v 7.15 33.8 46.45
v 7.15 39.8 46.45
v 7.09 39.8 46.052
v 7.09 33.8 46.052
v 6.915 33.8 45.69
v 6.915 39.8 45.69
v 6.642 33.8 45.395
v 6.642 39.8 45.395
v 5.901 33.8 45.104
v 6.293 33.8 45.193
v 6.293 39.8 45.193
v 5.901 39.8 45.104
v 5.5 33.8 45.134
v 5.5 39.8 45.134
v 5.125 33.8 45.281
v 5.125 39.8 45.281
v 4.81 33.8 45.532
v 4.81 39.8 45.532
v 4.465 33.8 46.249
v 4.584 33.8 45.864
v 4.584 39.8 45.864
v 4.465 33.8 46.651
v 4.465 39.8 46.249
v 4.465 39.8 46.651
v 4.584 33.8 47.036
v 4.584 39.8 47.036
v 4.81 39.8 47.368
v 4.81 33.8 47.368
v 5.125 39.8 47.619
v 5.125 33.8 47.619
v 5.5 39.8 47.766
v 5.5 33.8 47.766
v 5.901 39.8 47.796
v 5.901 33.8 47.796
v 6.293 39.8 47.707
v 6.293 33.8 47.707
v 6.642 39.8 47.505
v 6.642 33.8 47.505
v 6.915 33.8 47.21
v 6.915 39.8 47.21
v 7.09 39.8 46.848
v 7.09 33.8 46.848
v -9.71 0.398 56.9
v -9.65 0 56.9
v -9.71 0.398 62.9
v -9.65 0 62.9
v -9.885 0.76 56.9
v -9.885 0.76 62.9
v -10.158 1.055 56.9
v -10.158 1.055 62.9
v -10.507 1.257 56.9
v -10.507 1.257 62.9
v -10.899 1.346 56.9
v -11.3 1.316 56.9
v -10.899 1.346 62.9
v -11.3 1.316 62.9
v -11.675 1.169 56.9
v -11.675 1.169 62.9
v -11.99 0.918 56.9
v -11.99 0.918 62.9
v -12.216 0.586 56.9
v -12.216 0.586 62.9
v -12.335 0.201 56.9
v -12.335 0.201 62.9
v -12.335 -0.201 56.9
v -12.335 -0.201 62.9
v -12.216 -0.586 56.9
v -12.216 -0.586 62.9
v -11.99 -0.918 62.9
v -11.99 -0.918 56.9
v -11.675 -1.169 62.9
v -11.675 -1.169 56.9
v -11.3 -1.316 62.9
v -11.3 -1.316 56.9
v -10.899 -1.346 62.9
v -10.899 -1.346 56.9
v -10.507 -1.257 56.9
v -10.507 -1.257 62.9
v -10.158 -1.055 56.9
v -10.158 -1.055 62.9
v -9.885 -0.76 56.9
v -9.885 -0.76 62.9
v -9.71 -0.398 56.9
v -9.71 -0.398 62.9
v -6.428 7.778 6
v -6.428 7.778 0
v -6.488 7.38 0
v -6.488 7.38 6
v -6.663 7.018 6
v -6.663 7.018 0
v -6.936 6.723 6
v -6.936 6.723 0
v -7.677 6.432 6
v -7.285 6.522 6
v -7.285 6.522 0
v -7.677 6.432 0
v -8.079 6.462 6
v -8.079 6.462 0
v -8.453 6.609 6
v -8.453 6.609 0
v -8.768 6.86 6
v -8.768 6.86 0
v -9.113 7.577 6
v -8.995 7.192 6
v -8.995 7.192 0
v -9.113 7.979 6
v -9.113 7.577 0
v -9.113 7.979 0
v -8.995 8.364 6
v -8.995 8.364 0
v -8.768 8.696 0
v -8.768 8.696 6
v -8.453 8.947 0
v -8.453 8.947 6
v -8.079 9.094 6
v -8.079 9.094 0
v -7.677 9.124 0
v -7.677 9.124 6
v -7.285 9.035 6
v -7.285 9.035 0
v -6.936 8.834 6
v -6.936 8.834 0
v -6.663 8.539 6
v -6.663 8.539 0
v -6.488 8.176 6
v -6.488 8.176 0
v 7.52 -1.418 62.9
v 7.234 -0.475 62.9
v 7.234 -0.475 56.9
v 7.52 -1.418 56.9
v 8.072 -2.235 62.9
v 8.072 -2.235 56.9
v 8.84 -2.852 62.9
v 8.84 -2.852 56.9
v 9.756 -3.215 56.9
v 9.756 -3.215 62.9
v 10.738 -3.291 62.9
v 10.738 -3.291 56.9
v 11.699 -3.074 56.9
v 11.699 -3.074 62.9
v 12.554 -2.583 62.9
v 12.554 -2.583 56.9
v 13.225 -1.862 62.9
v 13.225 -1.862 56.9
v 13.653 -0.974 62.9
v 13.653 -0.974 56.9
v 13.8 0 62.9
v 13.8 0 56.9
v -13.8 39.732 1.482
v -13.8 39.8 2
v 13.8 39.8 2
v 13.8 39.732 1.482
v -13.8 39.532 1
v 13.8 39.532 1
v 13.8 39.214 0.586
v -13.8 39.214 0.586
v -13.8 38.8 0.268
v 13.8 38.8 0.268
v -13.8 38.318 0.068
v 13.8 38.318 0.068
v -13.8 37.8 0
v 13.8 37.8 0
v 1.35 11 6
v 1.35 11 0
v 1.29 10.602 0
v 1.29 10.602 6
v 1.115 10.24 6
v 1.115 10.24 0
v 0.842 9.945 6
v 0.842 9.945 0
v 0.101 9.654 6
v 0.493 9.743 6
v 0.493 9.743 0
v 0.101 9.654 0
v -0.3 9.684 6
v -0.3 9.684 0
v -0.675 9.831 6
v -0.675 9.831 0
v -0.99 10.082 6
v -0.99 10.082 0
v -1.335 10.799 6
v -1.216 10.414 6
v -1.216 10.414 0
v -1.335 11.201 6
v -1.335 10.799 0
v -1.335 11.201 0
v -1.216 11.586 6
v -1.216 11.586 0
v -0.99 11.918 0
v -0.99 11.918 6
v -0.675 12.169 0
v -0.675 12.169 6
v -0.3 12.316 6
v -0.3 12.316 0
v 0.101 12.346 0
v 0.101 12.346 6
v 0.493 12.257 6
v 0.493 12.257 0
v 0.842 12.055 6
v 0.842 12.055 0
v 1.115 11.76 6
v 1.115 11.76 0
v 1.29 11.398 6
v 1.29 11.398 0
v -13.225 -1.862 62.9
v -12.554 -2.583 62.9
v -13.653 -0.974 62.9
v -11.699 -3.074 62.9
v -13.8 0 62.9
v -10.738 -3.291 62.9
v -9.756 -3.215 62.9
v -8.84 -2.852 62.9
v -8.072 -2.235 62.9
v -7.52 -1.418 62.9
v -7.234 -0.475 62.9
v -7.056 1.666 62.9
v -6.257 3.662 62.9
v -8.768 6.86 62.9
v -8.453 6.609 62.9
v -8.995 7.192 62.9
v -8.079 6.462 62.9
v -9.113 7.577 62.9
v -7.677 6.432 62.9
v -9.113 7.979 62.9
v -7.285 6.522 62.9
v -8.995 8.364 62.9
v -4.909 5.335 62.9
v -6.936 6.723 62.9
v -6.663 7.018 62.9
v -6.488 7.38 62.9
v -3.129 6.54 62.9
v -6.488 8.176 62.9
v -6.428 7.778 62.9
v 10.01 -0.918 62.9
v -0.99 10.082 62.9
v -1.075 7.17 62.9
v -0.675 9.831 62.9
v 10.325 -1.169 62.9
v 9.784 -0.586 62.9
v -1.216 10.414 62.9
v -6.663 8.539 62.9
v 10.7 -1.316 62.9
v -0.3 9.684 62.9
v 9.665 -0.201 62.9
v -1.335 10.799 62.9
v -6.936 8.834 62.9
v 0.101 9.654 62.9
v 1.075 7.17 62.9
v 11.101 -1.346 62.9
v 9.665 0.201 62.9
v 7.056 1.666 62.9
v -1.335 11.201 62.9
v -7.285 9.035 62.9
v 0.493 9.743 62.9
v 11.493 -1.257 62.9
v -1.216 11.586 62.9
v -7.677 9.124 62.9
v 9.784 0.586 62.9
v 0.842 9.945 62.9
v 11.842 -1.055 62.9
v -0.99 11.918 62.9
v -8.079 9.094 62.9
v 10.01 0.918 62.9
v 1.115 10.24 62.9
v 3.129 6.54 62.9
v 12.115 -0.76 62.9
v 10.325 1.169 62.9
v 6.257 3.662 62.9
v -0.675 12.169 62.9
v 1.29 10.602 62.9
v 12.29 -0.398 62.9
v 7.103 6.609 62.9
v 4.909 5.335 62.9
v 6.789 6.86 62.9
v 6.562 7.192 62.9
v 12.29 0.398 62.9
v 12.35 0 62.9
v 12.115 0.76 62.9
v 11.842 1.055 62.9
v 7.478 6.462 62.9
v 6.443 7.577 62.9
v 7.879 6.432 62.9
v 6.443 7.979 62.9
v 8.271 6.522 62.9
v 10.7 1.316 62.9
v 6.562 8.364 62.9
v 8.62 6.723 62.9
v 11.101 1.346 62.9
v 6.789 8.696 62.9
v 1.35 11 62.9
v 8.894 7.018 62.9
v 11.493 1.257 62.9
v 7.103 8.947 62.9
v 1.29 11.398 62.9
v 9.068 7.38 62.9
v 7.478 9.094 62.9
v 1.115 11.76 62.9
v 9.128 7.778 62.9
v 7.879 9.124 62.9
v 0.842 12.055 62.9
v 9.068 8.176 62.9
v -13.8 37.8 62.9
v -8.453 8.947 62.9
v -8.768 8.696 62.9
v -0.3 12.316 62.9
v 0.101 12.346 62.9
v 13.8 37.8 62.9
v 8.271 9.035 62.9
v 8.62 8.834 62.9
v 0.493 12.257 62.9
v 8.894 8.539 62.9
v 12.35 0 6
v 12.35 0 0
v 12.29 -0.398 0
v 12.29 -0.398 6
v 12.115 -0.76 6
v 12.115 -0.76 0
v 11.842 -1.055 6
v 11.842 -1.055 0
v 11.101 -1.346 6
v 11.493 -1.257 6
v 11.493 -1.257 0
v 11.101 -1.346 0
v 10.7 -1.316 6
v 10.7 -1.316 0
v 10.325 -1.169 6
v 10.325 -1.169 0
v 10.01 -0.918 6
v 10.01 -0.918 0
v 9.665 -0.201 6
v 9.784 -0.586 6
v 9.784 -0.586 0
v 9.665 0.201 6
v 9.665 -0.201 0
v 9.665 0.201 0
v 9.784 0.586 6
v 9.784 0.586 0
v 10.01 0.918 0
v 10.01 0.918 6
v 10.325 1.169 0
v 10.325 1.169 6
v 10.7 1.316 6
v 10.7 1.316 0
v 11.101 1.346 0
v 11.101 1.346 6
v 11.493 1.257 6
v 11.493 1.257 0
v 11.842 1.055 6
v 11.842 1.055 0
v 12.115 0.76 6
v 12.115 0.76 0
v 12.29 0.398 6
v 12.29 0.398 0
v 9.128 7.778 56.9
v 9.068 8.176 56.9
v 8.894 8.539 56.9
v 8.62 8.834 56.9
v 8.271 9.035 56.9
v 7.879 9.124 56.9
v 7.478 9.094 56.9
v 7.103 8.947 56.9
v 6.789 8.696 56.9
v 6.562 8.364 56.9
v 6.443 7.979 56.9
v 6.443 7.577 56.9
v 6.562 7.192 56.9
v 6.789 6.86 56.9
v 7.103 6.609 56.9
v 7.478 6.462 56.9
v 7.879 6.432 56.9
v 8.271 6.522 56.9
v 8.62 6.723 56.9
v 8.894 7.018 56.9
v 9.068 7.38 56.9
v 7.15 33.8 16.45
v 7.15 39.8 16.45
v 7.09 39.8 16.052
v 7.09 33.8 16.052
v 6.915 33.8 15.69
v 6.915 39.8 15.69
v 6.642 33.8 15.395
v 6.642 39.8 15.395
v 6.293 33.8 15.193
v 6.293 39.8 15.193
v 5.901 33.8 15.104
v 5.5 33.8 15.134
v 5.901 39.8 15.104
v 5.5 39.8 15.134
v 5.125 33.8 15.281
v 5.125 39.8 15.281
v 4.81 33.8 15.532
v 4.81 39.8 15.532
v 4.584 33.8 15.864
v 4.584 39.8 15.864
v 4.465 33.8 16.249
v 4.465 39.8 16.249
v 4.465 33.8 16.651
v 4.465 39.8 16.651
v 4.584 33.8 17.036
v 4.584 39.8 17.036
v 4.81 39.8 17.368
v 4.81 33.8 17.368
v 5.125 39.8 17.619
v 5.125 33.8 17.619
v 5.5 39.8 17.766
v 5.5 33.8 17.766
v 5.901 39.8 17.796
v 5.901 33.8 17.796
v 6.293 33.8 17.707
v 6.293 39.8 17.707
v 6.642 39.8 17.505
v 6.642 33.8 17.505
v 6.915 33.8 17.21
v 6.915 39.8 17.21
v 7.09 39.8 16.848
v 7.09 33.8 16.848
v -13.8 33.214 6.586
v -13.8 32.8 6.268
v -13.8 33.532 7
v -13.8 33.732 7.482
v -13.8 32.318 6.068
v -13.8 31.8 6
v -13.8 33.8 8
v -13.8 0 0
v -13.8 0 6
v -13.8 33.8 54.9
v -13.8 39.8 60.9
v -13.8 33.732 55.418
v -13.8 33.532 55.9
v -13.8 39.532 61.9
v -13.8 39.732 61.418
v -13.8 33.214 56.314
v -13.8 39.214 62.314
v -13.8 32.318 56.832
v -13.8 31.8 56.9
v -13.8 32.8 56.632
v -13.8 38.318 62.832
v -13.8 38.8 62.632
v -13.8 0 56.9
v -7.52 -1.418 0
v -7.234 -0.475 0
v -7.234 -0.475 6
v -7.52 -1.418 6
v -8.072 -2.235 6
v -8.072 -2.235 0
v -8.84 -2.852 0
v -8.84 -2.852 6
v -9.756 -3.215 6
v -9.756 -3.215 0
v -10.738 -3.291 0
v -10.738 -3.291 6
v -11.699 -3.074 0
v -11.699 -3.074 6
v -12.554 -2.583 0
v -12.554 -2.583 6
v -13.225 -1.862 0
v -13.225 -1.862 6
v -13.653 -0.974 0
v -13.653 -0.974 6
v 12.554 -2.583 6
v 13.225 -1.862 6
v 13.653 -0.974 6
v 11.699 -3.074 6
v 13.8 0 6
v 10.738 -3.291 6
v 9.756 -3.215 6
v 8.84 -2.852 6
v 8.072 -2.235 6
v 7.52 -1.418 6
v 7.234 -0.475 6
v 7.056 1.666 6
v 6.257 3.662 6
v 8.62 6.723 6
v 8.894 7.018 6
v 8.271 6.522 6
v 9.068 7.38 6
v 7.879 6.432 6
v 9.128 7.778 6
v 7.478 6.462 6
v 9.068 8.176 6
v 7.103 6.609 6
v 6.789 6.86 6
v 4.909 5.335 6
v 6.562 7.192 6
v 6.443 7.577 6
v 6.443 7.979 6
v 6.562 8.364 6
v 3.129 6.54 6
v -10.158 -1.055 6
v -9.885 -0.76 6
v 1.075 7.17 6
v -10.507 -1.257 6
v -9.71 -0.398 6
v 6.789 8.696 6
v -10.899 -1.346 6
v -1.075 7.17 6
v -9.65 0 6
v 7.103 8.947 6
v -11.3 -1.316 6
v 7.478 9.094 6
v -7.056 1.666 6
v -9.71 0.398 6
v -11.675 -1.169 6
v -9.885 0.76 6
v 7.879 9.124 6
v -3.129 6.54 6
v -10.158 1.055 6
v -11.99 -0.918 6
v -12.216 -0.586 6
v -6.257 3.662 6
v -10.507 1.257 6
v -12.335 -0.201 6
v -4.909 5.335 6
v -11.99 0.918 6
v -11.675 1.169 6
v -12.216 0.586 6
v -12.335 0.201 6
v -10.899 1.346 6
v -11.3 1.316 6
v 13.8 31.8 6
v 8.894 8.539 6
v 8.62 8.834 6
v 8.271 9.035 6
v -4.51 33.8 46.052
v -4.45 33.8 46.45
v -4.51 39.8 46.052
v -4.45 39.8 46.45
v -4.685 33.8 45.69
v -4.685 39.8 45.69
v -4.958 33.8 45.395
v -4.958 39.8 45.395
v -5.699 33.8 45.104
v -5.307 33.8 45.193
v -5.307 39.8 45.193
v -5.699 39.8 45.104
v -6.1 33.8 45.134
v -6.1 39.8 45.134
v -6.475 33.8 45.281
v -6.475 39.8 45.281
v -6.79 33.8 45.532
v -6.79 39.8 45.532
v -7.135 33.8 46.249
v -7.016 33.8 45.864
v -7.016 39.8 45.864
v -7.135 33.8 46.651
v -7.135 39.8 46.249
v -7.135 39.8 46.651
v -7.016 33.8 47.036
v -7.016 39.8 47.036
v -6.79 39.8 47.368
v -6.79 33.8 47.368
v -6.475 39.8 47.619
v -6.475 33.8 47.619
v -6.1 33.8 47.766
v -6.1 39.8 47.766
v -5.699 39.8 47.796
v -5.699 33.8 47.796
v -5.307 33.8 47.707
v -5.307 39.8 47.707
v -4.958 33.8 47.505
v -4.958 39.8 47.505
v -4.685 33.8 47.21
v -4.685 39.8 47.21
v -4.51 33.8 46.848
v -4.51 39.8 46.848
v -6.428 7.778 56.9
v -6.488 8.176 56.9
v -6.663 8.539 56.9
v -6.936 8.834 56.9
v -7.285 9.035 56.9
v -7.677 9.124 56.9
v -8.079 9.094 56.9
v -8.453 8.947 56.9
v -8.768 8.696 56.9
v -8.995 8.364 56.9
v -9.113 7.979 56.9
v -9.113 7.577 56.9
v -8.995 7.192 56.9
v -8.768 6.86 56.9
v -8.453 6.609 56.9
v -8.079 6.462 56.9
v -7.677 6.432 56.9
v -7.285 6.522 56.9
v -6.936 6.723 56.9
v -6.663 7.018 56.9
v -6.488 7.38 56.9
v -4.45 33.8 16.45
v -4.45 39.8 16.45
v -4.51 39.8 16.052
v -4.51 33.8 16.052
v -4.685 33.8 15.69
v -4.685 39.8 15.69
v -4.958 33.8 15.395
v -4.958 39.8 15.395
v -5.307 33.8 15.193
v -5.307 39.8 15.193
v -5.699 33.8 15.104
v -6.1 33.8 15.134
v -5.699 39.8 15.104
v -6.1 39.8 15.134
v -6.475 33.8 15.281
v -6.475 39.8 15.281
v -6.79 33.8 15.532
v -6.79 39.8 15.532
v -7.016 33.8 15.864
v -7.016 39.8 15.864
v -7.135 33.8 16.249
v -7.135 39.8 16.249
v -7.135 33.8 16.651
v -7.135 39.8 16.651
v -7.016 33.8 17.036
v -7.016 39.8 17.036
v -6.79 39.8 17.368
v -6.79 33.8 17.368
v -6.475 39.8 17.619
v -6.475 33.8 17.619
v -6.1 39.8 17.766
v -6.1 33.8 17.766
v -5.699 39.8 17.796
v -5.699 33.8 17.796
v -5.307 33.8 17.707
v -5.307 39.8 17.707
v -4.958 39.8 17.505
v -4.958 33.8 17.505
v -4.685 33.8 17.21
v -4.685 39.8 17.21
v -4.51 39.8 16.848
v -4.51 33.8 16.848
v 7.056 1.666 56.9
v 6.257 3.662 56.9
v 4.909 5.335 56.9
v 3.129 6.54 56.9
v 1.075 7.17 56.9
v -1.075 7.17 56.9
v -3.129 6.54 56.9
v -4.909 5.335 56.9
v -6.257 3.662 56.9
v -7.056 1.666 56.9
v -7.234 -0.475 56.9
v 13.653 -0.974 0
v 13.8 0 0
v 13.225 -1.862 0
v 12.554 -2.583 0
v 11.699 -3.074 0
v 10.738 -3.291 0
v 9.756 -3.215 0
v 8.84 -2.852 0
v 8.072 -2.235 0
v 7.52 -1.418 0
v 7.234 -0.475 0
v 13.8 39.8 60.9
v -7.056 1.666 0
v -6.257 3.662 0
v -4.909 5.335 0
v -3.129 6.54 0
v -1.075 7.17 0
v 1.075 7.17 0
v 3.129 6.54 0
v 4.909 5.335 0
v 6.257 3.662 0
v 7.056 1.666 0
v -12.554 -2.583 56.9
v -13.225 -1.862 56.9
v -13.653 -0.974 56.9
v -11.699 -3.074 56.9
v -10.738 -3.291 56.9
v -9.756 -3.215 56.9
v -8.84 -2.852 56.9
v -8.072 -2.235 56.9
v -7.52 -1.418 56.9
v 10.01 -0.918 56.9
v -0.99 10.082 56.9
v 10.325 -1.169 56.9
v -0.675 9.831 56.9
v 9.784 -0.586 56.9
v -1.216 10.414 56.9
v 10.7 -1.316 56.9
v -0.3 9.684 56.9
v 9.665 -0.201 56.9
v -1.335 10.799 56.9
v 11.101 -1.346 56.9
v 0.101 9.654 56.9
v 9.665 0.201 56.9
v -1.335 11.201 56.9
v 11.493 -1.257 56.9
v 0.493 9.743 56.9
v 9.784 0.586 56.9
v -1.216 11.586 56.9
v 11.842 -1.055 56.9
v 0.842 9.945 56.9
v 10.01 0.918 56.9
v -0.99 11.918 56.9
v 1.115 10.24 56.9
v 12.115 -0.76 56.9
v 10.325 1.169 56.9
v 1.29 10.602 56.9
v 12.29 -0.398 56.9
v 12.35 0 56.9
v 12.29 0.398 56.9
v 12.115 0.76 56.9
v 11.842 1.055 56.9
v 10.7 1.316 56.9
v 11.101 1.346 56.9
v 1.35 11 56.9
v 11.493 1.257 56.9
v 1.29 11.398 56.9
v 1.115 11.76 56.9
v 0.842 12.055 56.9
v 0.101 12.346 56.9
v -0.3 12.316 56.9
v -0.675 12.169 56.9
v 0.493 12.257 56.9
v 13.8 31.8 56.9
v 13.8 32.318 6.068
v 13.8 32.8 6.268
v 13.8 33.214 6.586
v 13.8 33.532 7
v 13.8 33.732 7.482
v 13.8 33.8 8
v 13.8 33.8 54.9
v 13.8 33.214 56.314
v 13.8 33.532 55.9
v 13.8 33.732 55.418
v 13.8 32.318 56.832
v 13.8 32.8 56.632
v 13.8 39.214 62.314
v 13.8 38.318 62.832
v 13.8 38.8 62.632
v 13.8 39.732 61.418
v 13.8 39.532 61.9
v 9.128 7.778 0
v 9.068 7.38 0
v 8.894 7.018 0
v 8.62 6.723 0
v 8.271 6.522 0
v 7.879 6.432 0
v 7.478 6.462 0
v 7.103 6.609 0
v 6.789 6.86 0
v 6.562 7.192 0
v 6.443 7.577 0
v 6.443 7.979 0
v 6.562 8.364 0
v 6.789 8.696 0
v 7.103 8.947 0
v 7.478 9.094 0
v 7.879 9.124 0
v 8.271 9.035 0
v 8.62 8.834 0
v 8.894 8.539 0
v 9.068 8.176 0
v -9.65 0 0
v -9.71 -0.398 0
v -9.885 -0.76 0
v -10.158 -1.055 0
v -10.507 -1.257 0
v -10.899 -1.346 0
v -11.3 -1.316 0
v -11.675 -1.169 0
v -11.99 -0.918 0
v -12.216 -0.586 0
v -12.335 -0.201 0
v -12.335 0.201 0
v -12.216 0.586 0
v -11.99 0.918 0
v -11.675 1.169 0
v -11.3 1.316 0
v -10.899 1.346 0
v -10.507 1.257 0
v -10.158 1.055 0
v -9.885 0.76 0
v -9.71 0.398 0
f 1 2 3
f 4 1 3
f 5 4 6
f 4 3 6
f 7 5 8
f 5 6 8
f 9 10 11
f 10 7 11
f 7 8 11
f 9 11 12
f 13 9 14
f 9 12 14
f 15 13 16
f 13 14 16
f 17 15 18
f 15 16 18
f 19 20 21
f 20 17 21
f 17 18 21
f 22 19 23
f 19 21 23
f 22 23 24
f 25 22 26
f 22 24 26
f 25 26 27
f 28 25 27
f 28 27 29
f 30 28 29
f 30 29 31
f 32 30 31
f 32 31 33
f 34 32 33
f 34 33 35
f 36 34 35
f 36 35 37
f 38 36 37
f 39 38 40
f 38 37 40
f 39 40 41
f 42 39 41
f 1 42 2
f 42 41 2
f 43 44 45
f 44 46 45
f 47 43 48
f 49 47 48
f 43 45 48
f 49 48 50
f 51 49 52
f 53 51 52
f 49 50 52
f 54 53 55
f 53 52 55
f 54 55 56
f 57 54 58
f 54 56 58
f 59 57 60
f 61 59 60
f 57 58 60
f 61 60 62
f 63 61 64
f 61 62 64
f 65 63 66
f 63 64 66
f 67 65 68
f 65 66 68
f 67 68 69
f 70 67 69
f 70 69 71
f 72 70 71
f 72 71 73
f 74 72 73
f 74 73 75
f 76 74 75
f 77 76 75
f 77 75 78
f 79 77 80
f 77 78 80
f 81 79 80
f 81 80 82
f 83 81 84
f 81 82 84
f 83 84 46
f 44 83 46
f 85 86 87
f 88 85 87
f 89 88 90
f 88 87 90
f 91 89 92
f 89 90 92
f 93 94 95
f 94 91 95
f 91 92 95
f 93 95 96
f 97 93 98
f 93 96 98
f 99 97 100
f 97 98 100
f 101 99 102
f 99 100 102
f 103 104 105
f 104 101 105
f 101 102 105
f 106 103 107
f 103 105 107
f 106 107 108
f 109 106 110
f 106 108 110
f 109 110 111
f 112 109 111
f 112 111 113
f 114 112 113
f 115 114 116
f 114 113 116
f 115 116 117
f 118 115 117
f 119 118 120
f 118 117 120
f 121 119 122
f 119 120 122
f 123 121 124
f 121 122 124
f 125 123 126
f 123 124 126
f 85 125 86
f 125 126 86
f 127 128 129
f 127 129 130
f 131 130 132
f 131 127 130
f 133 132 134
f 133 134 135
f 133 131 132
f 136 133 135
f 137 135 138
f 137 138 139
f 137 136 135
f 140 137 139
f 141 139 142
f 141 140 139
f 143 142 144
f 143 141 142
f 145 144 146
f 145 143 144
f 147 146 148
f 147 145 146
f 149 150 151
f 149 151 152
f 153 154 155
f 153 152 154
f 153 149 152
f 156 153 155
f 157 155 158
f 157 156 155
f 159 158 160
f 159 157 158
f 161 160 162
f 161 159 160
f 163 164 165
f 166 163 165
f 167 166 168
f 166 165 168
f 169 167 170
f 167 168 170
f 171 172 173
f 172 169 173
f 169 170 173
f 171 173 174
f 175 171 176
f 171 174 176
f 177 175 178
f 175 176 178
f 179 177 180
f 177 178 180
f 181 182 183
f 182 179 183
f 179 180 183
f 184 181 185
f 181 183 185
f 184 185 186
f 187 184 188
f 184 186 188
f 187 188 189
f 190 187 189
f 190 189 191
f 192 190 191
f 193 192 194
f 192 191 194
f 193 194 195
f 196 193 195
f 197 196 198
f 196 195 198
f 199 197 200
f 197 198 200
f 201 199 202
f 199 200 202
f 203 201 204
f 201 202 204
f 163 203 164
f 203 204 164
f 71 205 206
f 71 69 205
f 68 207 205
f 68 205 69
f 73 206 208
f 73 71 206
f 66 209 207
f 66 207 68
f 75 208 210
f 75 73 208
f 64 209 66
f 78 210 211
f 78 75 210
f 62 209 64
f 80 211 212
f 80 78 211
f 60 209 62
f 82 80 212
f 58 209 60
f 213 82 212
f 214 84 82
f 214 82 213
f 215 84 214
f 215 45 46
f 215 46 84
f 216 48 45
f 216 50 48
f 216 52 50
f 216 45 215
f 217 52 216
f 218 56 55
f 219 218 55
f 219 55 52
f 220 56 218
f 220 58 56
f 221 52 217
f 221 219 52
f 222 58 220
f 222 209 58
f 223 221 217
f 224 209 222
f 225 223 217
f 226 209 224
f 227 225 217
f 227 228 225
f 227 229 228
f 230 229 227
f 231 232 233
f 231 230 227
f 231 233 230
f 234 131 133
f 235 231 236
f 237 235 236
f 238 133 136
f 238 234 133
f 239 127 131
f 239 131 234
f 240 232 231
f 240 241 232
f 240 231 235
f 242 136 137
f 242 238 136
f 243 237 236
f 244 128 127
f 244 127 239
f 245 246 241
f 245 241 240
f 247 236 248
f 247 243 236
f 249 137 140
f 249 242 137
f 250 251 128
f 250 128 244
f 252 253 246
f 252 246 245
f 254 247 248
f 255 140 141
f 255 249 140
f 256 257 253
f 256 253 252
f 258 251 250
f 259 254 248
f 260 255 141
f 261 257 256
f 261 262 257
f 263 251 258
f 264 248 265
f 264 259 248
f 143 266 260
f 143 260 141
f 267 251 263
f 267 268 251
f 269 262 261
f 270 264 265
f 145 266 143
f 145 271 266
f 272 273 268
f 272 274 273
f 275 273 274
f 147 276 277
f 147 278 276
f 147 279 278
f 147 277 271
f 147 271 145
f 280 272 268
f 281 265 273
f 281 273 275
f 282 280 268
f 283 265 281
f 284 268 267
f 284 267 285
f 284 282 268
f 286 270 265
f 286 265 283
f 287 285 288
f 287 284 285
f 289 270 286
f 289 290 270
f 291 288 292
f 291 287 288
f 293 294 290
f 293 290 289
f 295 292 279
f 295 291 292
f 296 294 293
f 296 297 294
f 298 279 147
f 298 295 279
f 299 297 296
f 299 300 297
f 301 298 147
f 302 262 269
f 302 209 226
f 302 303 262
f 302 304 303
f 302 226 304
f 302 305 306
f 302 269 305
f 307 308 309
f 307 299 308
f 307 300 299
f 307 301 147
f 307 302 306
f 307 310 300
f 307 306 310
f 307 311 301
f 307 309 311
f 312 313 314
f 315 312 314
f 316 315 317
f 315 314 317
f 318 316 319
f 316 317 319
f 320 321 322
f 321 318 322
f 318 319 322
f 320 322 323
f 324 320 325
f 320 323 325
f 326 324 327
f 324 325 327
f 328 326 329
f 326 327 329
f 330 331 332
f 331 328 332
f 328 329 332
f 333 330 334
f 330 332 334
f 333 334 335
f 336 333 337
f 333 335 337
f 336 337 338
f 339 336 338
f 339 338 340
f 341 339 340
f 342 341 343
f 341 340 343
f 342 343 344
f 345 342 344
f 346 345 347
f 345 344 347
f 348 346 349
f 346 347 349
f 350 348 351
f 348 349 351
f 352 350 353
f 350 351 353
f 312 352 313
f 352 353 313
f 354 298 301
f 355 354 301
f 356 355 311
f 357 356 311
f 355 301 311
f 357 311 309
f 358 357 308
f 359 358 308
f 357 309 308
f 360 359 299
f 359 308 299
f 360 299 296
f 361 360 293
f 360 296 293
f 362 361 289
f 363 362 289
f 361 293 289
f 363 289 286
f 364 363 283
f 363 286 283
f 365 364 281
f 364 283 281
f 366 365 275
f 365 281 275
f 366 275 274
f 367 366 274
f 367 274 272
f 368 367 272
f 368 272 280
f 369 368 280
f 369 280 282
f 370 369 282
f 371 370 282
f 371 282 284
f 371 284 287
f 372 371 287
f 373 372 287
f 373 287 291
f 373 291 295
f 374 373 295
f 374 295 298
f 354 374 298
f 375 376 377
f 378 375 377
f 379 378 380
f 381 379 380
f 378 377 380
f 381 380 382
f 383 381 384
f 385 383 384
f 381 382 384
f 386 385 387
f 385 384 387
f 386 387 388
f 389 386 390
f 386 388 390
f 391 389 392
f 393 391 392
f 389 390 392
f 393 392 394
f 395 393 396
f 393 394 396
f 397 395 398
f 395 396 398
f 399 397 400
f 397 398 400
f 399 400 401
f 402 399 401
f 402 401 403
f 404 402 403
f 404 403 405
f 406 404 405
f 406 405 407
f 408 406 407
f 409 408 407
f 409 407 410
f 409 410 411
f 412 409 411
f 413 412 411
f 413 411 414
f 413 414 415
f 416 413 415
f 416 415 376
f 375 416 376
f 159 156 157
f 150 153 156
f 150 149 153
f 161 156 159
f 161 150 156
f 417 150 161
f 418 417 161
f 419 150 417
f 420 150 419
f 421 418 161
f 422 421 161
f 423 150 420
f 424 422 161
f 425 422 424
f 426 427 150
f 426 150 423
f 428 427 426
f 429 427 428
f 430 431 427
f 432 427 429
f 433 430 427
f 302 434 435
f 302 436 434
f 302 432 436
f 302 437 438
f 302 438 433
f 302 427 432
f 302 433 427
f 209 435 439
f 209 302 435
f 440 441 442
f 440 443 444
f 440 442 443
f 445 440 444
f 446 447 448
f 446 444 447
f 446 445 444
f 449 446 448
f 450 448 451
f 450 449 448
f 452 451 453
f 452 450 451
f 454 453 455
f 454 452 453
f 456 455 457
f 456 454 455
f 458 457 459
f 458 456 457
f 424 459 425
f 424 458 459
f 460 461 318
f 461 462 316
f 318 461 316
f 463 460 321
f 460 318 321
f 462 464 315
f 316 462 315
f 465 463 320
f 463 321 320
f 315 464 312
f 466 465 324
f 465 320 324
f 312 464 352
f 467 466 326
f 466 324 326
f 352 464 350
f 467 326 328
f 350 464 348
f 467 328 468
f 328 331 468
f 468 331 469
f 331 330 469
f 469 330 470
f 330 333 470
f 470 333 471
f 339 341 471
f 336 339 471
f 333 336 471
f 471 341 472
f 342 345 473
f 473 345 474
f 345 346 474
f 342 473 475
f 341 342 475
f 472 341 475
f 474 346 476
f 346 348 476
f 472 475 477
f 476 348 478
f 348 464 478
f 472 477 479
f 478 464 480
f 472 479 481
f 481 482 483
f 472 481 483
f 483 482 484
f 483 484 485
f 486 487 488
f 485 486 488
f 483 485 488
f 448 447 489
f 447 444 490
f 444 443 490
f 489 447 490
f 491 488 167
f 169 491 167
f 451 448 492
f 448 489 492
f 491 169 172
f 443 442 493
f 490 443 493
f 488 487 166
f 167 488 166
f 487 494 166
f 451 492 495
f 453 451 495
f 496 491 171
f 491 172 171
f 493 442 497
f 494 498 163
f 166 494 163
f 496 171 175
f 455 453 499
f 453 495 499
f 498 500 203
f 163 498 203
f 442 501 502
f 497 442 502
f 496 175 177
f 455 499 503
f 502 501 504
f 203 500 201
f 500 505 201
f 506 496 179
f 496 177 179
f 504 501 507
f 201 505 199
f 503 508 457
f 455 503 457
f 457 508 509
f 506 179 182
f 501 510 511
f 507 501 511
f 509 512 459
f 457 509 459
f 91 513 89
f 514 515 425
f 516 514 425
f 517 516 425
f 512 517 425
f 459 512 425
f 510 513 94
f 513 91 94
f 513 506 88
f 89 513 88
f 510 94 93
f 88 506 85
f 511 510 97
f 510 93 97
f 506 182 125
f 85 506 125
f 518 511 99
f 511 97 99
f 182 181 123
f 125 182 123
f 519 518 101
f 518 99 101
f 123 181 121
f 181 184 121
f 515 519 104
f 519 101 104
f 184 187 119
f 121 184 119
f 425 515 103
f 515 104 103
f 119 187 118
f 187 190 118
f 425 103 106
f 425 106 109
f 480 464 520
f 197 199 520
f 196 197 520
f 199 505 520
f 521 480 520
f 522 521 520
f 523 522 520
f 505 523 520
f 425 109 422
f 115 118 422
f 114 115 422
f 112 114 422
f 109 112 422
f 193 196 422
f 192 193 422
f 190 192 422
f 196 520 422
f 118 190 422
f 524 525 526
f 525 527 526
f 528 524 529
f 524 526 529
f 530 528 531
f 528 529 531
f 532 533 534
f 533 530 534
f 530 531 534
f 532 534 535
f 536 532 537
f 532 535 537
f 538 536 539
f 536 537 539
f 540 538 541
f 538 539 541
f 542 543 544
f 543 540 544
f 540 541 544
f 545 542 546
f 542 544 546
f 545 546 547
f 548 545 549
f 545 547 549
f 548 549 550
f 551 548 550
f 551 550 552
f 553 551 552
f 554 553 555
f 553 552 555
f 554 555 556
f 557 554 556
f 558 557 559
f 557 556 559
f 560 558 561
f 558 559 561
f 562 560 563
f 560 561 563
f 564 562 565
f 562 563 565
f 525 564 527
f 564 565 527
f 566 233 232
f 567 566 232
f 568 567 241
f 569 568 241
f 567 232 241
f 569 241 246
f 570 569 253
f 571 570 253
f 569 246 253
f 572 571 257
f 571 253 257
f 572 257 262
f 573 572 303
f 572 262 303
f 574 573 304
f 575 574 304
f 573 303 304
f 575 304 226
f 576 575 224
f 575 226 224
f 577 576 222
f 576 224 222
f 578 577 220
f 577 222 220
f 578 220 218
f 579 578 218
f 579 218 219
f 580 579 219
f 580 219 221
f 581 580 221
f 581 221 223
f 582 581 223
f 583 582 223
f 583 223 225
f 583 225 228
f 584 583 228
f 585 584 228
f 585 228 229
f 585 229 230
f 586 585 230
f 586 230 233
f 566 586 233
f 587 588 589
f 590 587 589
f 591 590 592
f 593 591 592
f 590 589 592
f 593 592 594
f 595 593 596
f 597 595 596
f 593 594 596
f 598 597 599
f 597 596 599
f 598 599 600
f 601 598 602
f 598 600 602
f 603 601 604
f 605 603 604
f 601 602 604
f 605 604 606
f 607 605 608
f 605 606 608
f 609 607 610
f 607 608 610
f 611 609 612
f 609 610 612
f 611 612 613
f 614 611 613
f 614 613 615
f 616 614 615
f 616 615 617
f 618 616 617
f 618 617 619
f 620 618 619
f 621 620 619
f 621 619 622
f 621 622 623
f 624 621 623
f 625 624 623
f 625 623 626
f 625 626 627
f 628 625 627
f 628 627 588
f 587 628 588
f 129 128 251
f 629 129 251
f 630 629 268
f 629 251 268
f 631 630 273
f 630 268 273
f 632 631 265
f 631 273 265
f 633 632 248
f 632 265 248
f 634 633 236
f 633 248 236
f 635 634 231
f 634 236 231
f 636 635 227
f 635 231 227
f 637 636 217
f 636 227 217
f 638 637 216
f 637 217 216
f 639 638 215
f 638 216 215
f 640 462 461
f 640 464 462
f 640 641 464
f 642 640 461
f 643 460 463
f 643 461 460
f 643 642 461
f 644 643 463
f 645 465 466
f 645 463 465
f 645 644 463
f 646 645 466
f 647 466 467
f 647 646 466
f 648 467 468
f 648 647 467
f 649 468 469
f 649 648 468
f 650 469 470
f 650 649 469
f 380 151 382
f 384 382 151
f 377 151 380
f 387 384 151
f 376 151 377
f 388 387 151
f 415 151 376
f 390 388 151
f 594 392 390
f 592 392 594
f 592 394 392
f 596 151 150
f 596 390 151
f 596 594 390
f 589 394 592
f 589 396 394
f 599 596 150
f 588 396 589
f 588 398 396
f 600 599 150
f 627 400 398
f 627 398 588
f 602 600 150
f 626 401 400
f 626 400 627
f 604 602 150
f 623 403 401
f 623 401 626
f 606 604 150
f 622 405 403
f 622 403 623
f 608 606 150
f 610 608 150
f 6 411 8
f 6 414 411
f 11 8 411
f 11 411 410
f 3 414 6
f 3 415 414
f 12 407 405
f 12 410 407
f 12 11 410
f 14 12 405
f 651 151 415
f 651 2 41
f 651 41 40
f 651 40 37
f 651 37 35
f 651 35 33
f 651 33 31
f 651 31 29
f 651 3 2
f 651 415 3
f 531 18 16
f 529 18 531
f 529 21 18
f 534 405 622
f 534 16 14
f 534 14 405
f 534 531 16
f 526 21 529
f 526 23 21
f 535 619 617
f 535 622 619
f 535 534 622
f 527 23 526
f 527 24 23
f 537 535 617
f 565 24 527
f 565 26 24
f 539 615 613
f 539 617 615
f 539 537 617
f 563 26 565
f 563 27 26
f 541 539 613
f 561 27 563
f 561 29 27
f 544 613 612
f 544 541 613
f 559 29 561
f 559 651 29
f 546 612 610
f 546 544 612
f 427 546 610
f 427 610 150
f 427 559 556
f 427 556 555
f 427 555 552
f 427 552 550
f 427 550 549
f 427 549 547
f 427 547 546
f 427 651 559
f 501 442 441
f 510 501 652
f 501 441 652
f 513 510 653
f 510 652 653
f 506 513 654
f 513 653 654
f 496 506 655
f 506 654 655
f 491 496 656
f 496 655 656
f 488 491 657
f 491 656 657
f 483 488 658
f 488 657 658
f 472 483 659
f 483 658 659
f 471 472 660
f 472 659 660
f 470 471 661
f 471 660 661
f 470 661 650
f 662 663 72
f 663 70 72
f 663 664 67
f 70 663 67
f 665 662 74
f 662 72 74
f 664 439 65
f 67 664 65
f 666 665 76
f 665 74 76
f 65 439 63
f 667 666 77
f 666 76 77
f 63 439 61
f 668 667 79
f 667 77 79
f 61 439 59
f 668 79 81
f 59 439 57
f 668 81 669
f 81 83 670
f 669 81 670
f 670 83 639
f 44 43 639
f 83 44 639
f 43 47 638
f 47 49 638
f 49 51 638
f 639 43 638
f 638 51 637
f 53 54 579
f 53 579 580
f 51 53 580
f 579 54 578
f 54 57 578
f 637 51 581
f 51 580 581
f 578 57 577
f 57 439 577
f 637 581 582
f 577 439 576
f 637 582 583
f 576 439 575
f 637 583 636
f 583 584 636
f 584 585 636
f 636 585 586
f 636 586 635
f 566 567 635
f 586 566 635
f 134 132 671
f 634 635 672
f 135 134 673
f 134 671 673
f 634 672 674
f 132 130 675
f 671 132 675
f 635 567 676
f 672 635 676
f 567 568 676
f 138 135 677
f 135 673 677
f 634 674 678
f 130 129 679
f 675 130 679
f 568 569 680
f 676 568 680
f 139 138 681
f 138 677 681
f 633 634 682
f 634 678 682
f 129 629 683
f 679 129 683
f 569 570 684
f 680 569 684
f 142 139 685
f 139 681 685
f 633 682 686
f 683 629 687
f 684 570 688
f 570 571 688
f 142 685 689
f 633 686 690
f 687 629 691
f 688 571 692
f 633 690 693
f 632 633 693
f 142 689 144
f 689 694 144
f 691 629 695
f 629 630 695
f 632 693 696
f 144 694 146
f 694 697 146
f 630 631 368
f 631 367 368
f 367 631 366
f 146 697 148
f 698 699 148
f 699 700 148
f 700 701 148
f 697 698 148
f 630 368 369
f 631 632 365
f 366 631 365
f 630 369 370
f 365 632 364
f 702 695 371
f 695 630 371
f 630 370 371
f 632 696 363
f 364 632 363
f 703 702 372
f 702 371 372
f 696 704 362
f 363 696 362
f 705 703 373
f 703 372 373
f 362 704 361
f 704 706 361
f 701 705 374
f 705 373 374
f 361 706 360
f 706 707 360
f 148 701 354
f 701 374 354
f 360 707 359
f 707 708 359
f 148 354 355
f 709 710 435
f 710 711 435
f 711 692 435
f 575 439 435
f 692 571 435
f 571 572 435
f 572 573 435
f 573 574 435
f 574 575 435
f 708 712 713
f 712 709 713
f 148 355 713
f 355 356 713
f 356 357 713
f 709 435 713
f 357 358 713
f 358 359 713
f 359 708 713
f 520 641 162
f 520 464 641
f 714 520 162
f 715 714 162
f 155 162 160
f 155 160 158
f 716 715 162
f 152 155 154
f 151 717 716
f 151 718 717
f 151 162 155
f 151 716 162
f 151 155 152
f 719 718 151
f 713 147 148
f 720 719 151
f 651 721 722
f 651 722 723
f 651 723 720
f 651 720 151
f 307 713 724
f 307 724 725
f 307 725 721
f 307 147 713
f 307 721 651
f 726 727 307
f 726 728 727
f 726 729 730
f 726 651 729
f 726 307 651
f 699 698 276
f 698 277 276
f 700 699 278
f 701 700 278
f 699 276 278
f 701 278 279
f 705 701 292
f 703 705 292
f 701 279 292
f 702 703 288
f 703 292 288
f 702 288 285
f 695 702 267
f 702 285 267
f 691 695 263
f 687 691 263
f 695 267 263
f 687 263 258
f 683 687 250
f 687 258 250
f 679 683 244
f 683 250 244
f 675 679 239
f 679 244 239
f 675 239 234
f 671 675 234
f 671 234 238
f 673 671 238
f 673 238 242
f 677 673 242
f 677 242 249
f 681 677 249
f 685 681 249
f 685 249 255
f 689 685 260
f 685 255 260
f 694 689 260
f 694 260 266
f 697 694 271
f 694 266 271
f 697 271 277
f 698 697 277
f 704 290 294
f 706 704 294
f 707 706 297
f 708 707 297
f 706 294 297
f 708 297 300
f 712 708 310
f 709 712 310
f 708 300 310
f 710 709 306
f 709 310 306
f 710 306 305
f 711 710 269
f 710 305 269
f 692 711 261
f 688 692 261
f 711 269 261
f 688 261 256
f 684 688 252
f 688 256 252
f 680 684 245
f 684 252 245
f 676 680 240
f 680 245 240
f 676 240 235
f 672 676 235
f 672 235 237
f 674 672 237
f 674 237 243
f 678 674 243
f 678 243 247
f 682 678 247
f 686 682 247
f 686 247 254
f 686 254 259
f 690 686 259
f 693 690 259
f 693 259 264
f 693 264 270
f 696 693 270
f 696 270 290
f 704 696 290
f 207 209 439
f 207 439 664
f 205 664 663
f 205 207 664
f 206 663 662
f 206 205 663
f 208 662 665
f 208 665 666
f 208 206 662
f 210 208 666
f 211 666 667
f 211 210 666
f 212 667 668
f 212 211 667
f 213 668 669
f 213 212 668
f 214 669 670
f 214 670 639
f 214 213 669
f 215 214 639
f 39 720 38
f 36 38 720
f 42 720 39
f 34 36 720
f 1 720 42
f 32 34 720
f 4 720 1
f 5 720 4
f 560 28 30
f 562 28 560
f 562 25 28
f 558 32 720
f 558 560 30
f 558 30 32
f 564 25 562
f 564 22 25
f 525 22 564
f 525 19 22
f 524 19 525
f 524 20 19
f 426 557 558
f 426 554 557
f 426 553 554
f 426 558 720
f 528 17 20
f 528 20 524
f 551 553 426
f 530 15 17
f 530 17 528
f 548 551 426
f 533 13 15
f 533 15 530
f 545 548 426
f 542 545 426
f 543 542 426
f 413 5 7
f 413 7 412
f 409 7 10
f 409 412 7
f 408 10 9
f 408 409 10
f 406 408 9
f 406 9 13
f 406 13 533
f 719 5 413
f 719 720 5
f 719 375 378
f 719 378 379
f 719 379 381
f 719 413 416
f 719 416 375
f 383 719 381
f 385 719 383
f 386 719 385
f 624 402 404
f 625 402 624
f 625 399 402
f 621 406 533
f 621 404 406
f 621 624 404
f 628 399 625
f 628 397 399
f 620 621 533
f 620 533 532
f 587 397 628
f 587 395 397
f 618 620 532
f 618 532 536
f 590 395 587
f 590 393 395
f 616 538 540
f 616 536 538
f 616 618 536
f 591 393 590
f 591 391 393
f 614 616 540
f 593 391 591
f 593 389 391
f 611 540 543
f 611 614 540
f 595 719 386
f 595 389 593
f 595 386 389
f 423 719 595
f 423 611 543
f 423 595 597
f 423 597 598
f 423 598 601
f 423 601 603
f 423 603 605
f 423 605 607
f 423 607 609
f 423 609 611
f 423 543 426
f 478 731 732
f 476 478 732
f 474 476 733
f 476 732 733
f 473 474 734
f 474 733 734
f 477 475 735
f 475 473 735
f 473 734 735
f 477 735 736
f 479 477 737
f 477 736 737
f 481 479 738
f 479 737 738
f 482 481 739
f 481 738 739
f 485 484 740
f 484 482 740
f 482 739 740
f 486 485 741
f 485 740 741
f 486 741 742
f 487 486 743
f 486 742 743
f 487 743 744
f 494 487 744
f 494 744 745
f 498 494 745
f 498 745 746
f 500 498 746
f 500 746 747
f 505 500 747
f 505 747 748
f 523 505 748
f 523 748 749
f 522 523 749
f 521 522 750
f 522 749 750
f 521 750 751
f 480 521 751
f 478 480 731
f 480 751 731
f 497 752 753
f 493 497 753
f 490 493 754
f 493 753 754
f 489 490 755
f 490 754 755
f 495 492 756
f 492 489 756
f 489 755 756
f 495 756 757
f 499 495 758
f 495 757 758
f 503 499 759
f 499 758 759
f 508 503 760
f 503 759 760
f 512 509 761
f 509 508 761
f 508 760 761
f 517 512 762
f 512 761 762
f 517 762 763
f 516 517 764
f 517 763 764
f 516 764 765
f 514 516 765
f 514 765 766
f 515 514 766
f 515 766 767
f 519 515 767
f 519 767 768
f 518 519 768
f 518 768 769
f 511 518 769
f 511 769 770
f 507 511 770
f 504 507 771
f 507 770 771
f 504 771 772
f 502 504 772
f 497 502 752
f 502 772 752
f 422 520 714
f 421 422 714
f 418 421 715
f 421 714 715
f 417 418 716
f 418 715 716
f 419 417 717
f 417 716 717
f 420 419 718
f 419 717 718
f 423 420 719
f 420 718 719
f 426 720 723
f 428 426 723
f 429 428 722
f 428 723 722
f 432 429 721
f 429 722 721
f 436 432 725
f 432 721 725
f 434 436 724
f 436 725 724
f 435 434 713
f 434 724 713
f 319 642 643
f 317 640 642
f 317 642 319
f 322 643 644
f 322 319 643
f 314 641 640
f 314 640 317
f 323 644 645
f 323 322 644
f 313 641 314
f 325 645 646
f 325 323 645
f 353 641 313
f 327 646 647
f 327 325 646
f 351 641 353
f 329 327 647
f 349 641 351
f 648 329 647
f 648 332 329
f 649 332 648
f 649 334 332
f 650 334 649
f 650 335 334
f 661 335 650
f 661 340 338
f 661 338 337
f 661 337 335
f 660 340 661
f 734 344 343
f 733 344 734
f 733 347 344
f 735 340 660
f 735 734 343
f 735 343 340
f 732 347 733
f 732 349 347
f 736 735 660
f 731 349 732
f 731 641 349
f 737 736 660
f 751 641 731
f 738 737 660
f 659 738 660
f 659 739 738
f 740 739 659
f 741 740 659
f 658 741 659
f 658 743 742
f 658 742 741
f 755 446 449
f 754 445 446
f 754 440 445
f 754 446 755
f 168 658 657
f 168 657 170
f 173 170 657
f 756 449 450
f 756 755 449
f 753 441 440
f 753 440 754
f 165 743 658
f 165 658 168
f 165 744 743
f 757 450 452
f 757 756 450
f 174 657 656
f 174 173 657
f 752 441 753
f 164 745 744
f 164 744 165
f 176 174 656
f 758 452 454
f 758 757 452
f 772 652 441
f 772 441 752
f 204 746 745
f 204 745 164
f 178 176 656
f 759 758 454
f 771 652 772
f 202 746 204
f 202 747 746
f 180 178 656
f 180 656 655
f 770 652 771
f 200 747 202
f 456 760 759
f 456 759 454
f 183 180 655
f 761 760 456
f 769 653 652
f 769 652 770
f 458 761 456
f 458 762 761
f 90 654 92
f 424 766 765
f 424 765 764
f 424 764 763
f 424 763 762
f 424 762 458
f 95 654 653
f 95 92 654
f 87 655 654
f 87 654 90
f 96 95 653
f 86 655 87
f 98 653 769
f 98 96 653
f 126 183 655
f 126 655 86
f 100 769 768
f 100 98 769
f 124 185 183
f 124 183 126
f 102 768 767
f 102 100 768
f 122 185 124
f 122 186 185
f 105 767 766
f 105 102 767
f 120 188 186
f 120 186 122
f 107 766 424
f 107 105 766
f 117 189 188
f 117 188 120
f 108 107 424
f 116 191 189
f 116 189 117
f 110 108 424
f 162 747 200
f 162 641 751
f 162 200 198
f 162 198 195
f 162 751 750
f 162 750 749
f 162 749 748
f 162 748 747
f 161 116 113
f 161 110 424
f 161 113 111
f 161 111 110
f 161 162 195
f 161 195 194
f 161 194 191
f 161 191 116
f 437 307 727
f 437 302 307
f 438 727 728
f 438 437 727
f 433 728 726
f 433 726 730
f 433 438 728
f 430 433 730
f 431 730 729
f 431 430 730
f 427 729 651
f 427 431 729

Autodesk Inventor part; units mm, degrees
ref_plane "YZ Plane" through (0, 0, 0) normal (1, 0, 0) x (0, 1, 0)
ref_plane "XZ Plane" through (0, 0, 0) normal (0, 1, 0) x (-1, 0, 0)
ref_plane "XY Plane" through (0, 0, 0) normal (0, 0, 1) x (1, 0, 0)
ref_plane "작업 평면1" through (0, 0, 0) normal (0, 0, 1) x (1, 0, 0)
sketch "스케치1" plane through (0, 0, 0) normal (0, 0, 1) x (1, 0, 0)
  circle A0 centre (0, 0) radius 13.8 projected
  circle A1 centre (0, 0) radius 7.2 projected
  circle A2 centre (0, -11) radius 1.2813 projected
  circle A3 centre (-7.7782, -7.7782) radius 1.2813 projected
  circle A4 centre (-11, 0) radius 1.2813 projected
  circle A5 centre (-7.7782, 7.7782) radius 1.2813 projected
  circle A6 centre (0, 11) radius 1.2813 projected
  circle A7 centre (7.7782, 7.7782) radius 1.2813 projected
  circle A8 centre (11, 0) radius 1.2813 projected
  circle A9 centre (7.7782, -7.7782) radius 1.2813 projected
  line L0 (-13.8, 0) -> (-13.8, 13.8)
  line L1 (-13.8, 13.8) -> (13.8, 13.8)
  line L2 (13.8, 13.8) -> (13.8, 0)
  circle A10 centre (0, 0) radius 7.25
  arc A11 (7.2344, 0.4753) -> (13.8, 0) centre (10.5, 0) ccw
  arc A12 (-13.8, 0) -> (-7.2344, 0.4753) centre (-10.5, 0) ccw
  line L3 (7.25, 0) -> (7.2, 0)
  line L4 (-7.2, 0) -> (-7.25, 0)
  circle A13 centre (11, 0) radius 1.35
  circle A14 centre (7.7782, 7.7782) radius 1.35
  circle A15 centre (0, 11) radius 1.35
  circle A16 centre (-7.7782, 7.7782) radius 1.35
  circle A17 centre (-11, 0) radius 1.35
  line L5 (13.8, 13.8) -> (-13.8, 13.8)
  line L6 (-13.8, 13.8) -> (-13.8, 33.8)
  line L7 (-13.8, 33.8) -> (13.8, 33.8)
  line L8 (13.8, 33.8) -> (13.8, 13.8)
  line L9 (3, 33.8) -> (-3, 33.8)
  line L10 (-3, 33.8) -> (-3, 39.8)
  line L11 (-3, 39.8) -> (3, 39.8)
  line L12 (3, 39.8) -> (3, 33.8)
  point P0 (0, 0)
  point P1 (-7.2344, -0.4753)
  point P2 (7.2344, -0.4753)
  dimension "d0" = 14.5
  dimension "d1" = 2.7
  dimension "d2" = 2.7
  dimension "d3" = 2.7
  dimension "d4" = 2.7
  dimension "d5" = 2.7
  dimension "d6" = 20
  dimension "d7" = 6
  dimension "d8" = 6
extrude "돌출1" add sketch "스케치1" along normal blind 6 contours L0 L1 A0 | A0 A11 A10 A12 | A0 L1 L2 | L1 L6 L7 L8 | L10 L11 L12 L7 picked at (-4.6271, 10.5053)
sketch "스케치2" plane through (-3, 39.8, 0) normal (0, 1, 0) x (1, 0, 0)
  circle A0 centre (-5, -3) radius 1.35
  circle A1 centre (11, -3) radius 1.35
  point P0 (3, 0)
  dimension "d11" = 2.7
  dimension "d12" = 2.7
extrude "돌출2" cut sketch "스케치2" against normal blind 20
sketch "스케치3" plane through (0, 0, 6) normal (0, 0, 1) x (1, 0, 0)
  line L0 (-9.35, 33.8) -> (-9.35, 19.8) projected
  line L1 (-6.65, 33.8) -> (-6.65, 19.8) projected
  line L2 (15, 15) -> (-15, 15) projected
  line L3 (6.65, 33.8) -> (6.65, 19.8) projected
  line L4 (9.35, 33.8) -> (9.35, 19.8) projected
  line L5 (9.35, 26.8) -> (6.65, 26.8)
  line L6 (-6.65, 26.8) -> (-9.35, 26.8)
  line L7 (10.6, 27.9) -> (5.4, 27.9)
  line L8 (5.4, 27.9) -> (5.4, 25.7)
  line L9 (5.4, 25.7) -> (10.6, 25.7)
  line L10 (10.6, 25.7) -> (10.6, 27.9)
  line L11 (10.6, 27.9) -> (5.4, 25.7) construction
  line L12 (5.4, 27.9) -> (10.6, 25.7) construction
  line L13 (-5.4, 27.9) -> (-10.6, 27.9)
  line L14 (-10.6, 27.9) -> (-10.6, 25.7)
  line L15 (-10.6, 25.7) -> (-5.4, 25.7)
  line L16 (-5.4, 25.7) -> (-5.4, 27.9)
  line L17 (-5.4, 27.9) -> (-10.6, 25.7) construction
  line L18 (-10.6, 27.9) -> (-5.4, 25.7) construction
  point P0 (0, 0)
  point P1 (8, 26.8)
  point P2 (-8, 26.8)
  dimension "d15" = 5.2
  dimension "d16" = 2.2
  dimension "d17" = 5.2
  dimension "d18" = 2.2
extrude "돌출3" cut sketch "스케치3" against normal blind 20
sketch "스케치4" plane through (-3, 39.8, 0) normal (0, 1, 0) x (1, 0, 0)
  line L0 (-2, 0) -> (8, 0)
  line L1 (8, 0) -> (8, -6)
  line L2 (8, -6) -> (-2, -6)
  line L3 (-2, -6) -> (-2, 0)
  line L4 (-2, 0) -> (8, -6) construction
  line L5 (8, 0) -> (-2, -6) construction
  point P0 (3, 0)
  point P1 (3, -3)
  dimension "d21" = 10
  dimension "d22" = 6
extrude "돌출4" add sketch "스케치4" against normal blind 6
sketch "스케치5" plane through (0, 0, 6) normal (0, 0, 1) x (1, 0, 0)
  line L0 (-5, 33.8) -> (-13.8, 33.8) projected
  line L1 (13.8, 33.8) -> (5, 33.8) projected
  line L2 (-5, 39.8) -> (-5, 33.8) projected
  line L3 (-13.8, 33.8) -> (-13.8, 0) projected
  line L4 (13.8, 0) -> (13.8, 33.8) projected
  line L5 (-5, 39.8) -> (5, 39.8) projected
  line L6 (-13.8, 33.8) -> (13.8, 33.8)
  line L7 (13.8, 33.8) -> (13.8, 39.8)
  line L8 (13.8, 39.8) -> (-13.8, 39.8)
  line L9 (-13.8, 39.8) -> (-13.8, 33.8)
  point P0 (0, 0)
  point P1 (5, 39.8)
extrude "돌출5" cut sketch "스케치5" against normal blind 10
sketch "스케치6" plane through (0, 0, 6) normal (0, 0, 1) x (1, 0, 0)
  line L0 (-13.8, 33.8) -> (-13.8, 0) projected
  line L1 (13.8, 33.8) -> (-13.8, 33.8) projected
  line L2 (13.8, 0) -> (13.8, 33.8) projected
  line L3 (-13.8, 33.8) -> (13.8, 33.8)
  line L4 (13.8, 33.8) -> (13.8, 14.8)
  line L5 (13.8, 14.8) -> (-13.8, 14.8)
  line L6 (-13.8, 14.8) -> (-13.8, 33.8)
  point P0 (0, 0)
  point P1 (-13.8, 14.8)
  dimension "d27" = 19
extrude "돌출6" add sketch "스케치6" against normal blind 6
sketch "스케치7" plane through (0, 0, 6) normal (0, 0, 1) x (1, 0, 0)
  line L0 (13.8, 33.8) -> (-13.8, 33.8) projected
  line L1 (-13.8, 33.8) -> (-13.8, 0) projected
  arc A0 (-13.8, 0) -> (-7.2344, -0.4753) centre (-10.5, 0) ccw projected
  line L2 (13.8, 0) -> (13.8, 33.8) projected
  line L3 (-13.8, 33.8) -> (13.8, 33.8)
  line L4 (13.8, 33.8) -> (13.8, 39.8)
  line L5 (13.8, 39.8) -> (-13.8, 39.8)
  line L6 (-13.8, 39.8) -> (-13.8, 33.8)
  point P0 (0, 0)
  dimension "d30" = 6
extrude "돌출7" add sketch "스케치7" along normal blind 25.45
sketch "스케치8" plane through (0, 0, 6) normal (0, 0, -1) x (-1, 0, 0)
  line L0 (13.8, 39.8) -> (13.8, 33.8) projected
  line L1 (-13.8, 33.8) -> (13.8, 33.8) projected
  line L2 (13.8, 39.8) -> (13.8, 33.8) projected
  line L3 (-13.8, 39.8) -> (13.8, 39.8) projected
  line L4 (-13.8, 33.8) -> (-13.8, 39.8) projected
  line L5 (-13.8, 39.8) -> (13.8, 39.8) projected
  line L6 (-13.8, 39.8) -> (13.8, 39.8)
  line L7 (13.8, 39.8) -> (13.8, 33.8)
  line L8 (13.8, 33.8) -> (-13.8, 33.8)
  line L9 (-13.8, 33.8) -> (-13.8, 39.8)
  point P0 (0, 0)
extrude "돌출8" add sketch "스케치8" along normal blind 6
sketch "스케치9" plane through (-13.8, 39.8, 31.45) normal (0, 1, 0) x (1, 0, 0)
  line L0 (0, 31.45) -> (0, 0) projected
  line L1 (27.6, 0) -> (0, 0) projected
  line L2 (27.6, 31.45) -> (27.6, 0) projected
  line L3 (0, 31.45) -> (27.6, 31.45) projected
  line L4 (27.6, 25.45) -> (0, 25.45) projected
  circle A0 centre (8, 15) radius 1.35
  circle A1 centre (19.6, 15) radius 1.35
  point P0 (13.8, 31.45)
  dimension "d35" = 2.7
  dimension "d36" = 2.7
extrude "돌출9" cut sketch "스케치9" against normal blind 6 contours A0 | A1
fillet "모깎기1" radius 2 2 edges at (0, 39.8, 0) (0, 33.8, 6)
mirror "미러1" about plane through (0, 36.8, 31.45) normal (0, 0, 1)
properties part number "foot_right_64" material "PMMA 플라스틱"
